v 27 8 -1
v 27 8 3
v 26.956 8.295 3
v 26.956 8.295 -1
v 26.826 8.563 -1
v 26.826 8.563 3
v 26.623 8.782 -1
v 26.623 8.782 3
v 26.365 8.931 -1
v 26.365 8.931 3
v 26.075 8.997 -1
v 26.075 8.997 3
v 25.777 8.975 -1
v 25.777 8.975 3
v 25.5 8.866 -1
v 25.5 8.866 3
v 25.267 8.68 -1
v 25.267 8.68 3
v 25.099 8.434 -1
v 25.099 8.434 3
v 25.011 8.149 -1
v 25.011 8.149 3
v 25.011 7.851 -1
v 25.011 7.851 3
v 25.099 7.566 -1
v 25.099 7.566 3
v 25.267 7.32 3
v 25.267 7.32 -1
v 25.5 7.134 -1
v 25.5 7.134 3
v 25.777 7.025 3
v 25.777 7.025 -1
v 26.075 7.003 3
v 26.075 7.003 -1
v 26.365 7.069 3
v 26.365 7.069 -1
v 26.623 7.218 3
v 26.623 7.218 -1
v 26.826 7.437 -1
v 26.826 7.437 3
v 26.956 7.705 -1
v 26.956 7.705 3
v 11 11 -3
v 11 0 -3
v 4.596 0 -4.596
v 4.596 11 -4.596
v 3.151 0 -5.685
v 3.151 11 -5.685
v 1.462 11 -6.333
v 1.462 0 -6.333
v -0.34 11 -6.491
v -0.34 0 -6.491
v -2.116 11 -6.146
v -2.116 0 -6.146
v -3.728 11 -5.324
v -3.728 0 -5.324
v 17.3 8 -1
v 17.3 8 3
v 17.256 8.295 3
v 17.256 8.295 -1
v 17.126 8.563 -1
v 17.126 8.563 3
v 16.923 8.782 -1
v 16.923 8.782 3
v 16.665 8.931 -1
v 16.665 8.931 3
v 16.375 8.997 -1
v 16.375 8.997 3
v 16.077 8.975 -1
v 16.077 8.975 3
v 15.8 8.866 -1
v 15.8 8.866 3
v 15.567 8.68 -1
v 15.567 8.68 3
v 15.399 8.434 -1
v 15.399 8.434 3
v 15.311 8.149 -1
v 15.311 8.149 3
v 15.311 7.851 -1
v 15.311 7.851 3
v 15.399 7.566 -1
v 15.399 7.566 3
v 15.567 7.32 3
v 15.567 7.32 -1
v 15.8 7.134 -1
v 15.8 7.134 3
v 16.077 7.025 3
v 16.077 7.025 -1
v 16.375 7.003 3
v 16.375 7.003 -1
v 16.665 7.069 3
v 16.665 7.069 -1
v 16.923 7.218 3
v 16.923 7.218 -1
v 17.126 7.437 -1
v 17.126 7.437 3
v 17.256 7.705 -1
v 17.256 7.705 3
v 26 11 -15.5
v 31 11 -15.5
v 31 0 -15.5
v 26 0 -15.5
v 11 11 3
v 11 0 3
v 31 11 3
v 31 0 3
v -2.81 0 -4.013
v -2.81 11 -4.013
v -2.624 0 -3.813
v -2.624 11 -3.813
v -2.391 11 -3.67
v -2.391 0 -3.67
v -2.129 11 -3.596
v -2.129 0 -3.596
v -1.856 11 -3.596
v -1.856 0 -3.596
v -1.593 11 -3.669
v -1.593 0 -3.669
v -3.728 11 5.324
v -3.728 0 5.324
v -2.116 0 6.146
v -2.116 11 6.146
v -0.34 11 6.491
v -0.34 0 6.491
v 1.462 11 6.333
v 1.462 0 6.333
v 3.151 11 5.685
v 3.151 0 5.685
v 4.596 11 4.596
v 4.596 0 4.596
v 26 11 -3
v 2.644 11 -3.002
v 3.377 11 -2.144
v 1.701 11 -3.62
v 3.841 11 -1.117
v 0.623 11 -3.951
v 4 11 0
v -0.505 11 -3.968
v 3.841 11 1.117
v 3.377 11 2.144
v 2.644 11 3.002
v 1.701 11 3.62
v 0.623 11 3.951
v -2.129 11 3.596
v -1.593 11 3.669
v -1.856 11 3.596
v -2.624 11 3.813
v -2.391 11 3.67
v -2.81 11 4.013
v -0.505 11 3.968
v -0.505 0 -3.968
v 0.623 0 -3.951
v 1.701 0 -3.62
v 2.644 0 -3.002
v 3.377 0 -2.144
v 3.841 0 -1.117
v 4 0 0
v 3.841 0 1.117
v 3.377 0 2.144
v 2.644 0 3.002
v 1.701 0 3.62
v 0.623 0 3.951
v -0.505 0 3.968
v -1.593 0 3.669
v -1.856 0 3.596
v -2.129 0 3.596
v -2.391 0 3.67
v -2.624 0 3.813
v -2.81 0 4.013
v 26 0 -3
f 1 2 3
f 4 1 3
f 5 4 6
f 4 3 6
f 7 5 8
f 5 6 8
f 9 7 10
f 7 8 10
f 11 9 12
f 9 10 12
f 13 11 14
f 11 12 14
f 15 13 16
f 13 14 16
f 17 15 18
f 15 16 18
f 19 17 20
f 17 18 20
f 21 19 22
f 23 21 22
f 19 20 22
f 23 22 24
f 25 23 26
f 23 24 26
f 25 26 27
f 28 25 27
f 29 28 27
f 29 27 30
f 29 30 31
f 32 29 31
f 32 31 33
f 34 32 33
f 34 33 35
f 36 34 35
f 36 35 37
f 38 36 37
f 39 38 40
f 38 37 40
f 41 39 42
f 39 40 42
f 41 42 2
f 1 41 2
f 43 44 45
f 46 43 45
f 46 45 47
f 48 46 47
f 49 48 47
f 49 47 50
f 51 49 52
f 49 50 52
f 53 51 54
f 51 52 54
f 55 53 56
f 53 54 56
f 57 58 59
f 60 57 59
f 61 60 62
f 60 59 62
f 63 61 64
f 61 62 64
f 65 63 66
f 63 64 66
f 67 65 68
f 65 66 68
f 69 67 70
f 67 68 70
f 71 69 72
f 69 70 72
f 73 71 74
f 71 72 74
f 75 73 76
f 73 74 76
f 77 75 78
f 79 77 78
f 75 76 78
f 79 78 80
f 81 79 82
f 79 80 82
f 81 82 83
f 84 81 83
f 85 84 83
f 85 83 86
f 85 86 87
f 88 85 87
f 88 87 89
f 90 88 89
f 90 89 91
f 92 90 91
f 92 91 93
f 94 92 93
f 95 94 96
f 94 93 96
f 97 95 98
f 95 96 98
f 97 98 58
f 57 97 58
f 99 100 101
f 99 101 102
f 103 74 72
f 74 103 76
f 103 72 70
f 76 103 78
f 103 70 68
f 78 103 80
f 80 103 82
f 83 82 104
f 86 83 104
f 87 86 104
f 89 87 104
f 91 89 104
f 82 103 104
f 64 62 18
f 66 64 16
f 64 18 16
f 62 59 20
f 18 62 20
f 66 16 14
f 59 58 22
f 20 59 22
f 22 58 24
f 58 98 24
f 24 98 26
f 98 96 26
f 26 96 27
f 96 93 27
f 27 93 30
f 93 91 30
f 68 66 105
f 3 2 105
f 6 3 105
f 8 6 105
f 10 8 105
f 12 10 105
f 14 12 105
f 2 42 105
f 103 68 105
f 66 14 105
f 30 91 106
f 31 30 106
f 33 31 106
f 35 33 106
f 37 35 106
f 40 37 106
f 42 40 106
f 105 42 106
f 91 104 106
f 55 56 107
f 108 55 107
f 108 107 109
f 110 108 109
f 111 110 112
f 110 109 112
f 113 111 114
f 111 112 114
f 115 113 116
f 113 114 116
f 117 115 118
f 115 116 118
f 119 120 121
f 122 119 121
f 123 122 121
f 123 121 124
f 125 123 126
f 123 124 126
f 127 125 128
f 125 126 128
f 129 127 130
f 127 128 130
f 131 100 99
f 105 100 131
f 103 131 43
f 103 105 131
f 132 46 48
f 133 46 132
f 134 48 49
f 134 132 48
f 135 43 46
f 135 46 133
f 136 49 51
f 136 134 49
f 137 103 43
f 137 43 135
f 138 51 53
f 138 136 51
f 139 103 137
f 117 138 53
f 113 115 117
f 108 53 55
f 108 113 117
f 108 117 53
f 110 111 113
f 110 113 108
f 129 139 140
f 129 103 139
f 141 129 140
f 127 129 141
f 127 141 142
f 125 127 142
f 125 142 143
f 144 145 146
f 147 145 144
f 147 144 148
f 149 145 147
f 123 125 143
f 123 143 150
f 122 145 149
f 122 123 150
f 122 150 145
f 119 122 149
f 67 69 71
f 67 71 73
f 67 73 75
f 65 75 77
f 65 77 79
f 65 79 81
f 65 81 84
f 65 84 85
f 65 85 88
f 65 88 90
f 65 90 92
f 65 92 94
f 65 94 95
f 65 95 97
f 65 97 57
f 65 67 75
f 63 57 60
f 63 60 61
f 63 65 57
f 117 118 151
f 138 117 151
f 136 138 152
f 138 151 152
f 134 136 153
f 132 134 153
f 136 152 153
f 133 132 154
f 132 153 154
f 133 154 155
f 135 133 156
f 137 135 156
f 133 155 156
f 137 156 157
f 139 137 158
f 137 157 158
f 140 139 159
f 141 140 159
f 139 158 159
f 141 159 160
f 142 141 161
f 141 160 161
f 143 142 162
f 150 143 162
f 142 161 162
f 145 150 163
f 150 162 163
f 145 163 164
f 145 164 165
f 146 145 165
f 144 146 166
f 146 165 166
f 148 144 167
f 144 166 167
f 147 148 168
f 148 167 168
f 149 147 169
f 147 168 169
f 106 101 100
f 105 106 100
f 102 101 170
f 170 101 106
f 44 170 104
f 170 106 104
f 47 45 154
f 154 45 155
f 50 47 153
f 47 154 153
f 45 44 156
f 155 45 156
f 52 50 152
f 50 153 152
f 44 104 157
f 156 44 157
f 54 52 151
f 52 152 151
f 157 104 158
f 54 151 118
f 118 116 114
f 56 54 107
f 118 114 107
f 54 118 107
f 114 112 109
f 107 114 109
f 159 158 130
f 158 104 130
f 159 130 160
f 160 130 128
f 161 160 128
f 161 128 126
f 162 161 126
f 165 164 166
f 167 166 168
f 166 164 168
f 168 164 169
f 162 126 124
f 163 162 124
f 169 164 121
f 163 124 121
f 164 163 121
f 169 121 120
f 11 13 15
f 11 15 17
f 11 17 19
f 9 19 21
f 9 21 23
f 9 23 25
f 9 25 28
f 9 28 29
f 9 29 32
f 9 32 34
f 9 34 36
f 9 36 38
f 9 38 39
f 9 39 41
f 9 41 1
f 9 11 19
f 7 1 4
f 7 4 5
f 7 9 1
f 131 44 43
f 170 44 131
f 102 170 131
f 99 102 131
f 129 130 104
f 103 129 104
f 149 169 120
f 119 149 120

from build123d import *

# Parameters (mm, degrees)
ESQUISSE1_W             = 20
ESQUISSE1_H             = 6
BOSS_EXTRU_1_DEPTH      = 11
ESQUISSE2_R             = 1
ENL_V_MAT_EXTRU_1_DEPTH = 4
ESQUISSE3_W             = 5
ESQUISSE3_H             = 11
BOSS_EXTRU_2_DEPTH      = 12.5


with BuildPart() as part:
    # Esquisse1 → Boss.-Extru.1 (new body)
    with BuildSketch(Plane(origin=(0, 0, 0), x_dir=(1, 0, 0), z_dir=(0, 1, 0))):
        with Locations((21, 0)):
            Rectangle(ESQUISSE1_W, ESQUISSE1_H)
        with BuildLine():
            Line((11, -3), (11, 3))
            Line((11, 3), (4.596194078, 4.596194078))
            ThreePointArc((4.596194078, 4.596194078), (0.566512328, 6.475265538), (-3.728246836, 5.324488288))
            Line((-3.728246836, 5.324488288), (-2.809939195, 4.013009061))
            ThreePointArc((-2.809939195, 4.013009061), (-2.262538006, 3.624217858), (-1.592629721, 3.669268398))
            ThreePointArc((-1.592629721, 3.669268398), (4, 0), (-1.592629721, -3.669268398))
            ThreePointArc((-1.592629721, -3.669268398), (-2.262538006, -3.624217858), (-2.809939195, -4.013009061))
            Line((-2.809939195, -4.013009061), (-3.728246836, -5.324488288))
            ThreePointArc((-3.728246836, -5.324488288), (0.566512328, -6.475265538), (4.596194078, -4.596194078))
            Line((4.596194078, -4.596194078), (11, -3))
        make_face()
    extrude(amount=BOSS_EXTRU_1_DEPTH)

    # Esquisse2 → Enlèv. mat.-Extru.1 (cut)
    with BuildSketch(Plane.XY.offset(3)):
        with Locations((16.3, 8)):
            Circle(ESQUISSE2_R)
        with Locations((26, 8)):
            Circle(ESQUISSE2_R)
    extrude(amount=-ENL_V_MAT_EXTRU_1_DEPTH, mode=Mode.SUBTRACT)

    # Esquisse3 → Boss.-Extru.2 (add)
    with BuildSketch(Plane(origin=(0, 0, -3), x_dir=(-1, 0, 0), z_dir=(0, 0, -1))):
        with Locations((-28.5, 5.5)):
            Rectangle(ESQUISSE3_W, ESQUISSE3_H)
    extrude(amount=BOSS_EXTRU_2_DEPTH)


solid = part.part
